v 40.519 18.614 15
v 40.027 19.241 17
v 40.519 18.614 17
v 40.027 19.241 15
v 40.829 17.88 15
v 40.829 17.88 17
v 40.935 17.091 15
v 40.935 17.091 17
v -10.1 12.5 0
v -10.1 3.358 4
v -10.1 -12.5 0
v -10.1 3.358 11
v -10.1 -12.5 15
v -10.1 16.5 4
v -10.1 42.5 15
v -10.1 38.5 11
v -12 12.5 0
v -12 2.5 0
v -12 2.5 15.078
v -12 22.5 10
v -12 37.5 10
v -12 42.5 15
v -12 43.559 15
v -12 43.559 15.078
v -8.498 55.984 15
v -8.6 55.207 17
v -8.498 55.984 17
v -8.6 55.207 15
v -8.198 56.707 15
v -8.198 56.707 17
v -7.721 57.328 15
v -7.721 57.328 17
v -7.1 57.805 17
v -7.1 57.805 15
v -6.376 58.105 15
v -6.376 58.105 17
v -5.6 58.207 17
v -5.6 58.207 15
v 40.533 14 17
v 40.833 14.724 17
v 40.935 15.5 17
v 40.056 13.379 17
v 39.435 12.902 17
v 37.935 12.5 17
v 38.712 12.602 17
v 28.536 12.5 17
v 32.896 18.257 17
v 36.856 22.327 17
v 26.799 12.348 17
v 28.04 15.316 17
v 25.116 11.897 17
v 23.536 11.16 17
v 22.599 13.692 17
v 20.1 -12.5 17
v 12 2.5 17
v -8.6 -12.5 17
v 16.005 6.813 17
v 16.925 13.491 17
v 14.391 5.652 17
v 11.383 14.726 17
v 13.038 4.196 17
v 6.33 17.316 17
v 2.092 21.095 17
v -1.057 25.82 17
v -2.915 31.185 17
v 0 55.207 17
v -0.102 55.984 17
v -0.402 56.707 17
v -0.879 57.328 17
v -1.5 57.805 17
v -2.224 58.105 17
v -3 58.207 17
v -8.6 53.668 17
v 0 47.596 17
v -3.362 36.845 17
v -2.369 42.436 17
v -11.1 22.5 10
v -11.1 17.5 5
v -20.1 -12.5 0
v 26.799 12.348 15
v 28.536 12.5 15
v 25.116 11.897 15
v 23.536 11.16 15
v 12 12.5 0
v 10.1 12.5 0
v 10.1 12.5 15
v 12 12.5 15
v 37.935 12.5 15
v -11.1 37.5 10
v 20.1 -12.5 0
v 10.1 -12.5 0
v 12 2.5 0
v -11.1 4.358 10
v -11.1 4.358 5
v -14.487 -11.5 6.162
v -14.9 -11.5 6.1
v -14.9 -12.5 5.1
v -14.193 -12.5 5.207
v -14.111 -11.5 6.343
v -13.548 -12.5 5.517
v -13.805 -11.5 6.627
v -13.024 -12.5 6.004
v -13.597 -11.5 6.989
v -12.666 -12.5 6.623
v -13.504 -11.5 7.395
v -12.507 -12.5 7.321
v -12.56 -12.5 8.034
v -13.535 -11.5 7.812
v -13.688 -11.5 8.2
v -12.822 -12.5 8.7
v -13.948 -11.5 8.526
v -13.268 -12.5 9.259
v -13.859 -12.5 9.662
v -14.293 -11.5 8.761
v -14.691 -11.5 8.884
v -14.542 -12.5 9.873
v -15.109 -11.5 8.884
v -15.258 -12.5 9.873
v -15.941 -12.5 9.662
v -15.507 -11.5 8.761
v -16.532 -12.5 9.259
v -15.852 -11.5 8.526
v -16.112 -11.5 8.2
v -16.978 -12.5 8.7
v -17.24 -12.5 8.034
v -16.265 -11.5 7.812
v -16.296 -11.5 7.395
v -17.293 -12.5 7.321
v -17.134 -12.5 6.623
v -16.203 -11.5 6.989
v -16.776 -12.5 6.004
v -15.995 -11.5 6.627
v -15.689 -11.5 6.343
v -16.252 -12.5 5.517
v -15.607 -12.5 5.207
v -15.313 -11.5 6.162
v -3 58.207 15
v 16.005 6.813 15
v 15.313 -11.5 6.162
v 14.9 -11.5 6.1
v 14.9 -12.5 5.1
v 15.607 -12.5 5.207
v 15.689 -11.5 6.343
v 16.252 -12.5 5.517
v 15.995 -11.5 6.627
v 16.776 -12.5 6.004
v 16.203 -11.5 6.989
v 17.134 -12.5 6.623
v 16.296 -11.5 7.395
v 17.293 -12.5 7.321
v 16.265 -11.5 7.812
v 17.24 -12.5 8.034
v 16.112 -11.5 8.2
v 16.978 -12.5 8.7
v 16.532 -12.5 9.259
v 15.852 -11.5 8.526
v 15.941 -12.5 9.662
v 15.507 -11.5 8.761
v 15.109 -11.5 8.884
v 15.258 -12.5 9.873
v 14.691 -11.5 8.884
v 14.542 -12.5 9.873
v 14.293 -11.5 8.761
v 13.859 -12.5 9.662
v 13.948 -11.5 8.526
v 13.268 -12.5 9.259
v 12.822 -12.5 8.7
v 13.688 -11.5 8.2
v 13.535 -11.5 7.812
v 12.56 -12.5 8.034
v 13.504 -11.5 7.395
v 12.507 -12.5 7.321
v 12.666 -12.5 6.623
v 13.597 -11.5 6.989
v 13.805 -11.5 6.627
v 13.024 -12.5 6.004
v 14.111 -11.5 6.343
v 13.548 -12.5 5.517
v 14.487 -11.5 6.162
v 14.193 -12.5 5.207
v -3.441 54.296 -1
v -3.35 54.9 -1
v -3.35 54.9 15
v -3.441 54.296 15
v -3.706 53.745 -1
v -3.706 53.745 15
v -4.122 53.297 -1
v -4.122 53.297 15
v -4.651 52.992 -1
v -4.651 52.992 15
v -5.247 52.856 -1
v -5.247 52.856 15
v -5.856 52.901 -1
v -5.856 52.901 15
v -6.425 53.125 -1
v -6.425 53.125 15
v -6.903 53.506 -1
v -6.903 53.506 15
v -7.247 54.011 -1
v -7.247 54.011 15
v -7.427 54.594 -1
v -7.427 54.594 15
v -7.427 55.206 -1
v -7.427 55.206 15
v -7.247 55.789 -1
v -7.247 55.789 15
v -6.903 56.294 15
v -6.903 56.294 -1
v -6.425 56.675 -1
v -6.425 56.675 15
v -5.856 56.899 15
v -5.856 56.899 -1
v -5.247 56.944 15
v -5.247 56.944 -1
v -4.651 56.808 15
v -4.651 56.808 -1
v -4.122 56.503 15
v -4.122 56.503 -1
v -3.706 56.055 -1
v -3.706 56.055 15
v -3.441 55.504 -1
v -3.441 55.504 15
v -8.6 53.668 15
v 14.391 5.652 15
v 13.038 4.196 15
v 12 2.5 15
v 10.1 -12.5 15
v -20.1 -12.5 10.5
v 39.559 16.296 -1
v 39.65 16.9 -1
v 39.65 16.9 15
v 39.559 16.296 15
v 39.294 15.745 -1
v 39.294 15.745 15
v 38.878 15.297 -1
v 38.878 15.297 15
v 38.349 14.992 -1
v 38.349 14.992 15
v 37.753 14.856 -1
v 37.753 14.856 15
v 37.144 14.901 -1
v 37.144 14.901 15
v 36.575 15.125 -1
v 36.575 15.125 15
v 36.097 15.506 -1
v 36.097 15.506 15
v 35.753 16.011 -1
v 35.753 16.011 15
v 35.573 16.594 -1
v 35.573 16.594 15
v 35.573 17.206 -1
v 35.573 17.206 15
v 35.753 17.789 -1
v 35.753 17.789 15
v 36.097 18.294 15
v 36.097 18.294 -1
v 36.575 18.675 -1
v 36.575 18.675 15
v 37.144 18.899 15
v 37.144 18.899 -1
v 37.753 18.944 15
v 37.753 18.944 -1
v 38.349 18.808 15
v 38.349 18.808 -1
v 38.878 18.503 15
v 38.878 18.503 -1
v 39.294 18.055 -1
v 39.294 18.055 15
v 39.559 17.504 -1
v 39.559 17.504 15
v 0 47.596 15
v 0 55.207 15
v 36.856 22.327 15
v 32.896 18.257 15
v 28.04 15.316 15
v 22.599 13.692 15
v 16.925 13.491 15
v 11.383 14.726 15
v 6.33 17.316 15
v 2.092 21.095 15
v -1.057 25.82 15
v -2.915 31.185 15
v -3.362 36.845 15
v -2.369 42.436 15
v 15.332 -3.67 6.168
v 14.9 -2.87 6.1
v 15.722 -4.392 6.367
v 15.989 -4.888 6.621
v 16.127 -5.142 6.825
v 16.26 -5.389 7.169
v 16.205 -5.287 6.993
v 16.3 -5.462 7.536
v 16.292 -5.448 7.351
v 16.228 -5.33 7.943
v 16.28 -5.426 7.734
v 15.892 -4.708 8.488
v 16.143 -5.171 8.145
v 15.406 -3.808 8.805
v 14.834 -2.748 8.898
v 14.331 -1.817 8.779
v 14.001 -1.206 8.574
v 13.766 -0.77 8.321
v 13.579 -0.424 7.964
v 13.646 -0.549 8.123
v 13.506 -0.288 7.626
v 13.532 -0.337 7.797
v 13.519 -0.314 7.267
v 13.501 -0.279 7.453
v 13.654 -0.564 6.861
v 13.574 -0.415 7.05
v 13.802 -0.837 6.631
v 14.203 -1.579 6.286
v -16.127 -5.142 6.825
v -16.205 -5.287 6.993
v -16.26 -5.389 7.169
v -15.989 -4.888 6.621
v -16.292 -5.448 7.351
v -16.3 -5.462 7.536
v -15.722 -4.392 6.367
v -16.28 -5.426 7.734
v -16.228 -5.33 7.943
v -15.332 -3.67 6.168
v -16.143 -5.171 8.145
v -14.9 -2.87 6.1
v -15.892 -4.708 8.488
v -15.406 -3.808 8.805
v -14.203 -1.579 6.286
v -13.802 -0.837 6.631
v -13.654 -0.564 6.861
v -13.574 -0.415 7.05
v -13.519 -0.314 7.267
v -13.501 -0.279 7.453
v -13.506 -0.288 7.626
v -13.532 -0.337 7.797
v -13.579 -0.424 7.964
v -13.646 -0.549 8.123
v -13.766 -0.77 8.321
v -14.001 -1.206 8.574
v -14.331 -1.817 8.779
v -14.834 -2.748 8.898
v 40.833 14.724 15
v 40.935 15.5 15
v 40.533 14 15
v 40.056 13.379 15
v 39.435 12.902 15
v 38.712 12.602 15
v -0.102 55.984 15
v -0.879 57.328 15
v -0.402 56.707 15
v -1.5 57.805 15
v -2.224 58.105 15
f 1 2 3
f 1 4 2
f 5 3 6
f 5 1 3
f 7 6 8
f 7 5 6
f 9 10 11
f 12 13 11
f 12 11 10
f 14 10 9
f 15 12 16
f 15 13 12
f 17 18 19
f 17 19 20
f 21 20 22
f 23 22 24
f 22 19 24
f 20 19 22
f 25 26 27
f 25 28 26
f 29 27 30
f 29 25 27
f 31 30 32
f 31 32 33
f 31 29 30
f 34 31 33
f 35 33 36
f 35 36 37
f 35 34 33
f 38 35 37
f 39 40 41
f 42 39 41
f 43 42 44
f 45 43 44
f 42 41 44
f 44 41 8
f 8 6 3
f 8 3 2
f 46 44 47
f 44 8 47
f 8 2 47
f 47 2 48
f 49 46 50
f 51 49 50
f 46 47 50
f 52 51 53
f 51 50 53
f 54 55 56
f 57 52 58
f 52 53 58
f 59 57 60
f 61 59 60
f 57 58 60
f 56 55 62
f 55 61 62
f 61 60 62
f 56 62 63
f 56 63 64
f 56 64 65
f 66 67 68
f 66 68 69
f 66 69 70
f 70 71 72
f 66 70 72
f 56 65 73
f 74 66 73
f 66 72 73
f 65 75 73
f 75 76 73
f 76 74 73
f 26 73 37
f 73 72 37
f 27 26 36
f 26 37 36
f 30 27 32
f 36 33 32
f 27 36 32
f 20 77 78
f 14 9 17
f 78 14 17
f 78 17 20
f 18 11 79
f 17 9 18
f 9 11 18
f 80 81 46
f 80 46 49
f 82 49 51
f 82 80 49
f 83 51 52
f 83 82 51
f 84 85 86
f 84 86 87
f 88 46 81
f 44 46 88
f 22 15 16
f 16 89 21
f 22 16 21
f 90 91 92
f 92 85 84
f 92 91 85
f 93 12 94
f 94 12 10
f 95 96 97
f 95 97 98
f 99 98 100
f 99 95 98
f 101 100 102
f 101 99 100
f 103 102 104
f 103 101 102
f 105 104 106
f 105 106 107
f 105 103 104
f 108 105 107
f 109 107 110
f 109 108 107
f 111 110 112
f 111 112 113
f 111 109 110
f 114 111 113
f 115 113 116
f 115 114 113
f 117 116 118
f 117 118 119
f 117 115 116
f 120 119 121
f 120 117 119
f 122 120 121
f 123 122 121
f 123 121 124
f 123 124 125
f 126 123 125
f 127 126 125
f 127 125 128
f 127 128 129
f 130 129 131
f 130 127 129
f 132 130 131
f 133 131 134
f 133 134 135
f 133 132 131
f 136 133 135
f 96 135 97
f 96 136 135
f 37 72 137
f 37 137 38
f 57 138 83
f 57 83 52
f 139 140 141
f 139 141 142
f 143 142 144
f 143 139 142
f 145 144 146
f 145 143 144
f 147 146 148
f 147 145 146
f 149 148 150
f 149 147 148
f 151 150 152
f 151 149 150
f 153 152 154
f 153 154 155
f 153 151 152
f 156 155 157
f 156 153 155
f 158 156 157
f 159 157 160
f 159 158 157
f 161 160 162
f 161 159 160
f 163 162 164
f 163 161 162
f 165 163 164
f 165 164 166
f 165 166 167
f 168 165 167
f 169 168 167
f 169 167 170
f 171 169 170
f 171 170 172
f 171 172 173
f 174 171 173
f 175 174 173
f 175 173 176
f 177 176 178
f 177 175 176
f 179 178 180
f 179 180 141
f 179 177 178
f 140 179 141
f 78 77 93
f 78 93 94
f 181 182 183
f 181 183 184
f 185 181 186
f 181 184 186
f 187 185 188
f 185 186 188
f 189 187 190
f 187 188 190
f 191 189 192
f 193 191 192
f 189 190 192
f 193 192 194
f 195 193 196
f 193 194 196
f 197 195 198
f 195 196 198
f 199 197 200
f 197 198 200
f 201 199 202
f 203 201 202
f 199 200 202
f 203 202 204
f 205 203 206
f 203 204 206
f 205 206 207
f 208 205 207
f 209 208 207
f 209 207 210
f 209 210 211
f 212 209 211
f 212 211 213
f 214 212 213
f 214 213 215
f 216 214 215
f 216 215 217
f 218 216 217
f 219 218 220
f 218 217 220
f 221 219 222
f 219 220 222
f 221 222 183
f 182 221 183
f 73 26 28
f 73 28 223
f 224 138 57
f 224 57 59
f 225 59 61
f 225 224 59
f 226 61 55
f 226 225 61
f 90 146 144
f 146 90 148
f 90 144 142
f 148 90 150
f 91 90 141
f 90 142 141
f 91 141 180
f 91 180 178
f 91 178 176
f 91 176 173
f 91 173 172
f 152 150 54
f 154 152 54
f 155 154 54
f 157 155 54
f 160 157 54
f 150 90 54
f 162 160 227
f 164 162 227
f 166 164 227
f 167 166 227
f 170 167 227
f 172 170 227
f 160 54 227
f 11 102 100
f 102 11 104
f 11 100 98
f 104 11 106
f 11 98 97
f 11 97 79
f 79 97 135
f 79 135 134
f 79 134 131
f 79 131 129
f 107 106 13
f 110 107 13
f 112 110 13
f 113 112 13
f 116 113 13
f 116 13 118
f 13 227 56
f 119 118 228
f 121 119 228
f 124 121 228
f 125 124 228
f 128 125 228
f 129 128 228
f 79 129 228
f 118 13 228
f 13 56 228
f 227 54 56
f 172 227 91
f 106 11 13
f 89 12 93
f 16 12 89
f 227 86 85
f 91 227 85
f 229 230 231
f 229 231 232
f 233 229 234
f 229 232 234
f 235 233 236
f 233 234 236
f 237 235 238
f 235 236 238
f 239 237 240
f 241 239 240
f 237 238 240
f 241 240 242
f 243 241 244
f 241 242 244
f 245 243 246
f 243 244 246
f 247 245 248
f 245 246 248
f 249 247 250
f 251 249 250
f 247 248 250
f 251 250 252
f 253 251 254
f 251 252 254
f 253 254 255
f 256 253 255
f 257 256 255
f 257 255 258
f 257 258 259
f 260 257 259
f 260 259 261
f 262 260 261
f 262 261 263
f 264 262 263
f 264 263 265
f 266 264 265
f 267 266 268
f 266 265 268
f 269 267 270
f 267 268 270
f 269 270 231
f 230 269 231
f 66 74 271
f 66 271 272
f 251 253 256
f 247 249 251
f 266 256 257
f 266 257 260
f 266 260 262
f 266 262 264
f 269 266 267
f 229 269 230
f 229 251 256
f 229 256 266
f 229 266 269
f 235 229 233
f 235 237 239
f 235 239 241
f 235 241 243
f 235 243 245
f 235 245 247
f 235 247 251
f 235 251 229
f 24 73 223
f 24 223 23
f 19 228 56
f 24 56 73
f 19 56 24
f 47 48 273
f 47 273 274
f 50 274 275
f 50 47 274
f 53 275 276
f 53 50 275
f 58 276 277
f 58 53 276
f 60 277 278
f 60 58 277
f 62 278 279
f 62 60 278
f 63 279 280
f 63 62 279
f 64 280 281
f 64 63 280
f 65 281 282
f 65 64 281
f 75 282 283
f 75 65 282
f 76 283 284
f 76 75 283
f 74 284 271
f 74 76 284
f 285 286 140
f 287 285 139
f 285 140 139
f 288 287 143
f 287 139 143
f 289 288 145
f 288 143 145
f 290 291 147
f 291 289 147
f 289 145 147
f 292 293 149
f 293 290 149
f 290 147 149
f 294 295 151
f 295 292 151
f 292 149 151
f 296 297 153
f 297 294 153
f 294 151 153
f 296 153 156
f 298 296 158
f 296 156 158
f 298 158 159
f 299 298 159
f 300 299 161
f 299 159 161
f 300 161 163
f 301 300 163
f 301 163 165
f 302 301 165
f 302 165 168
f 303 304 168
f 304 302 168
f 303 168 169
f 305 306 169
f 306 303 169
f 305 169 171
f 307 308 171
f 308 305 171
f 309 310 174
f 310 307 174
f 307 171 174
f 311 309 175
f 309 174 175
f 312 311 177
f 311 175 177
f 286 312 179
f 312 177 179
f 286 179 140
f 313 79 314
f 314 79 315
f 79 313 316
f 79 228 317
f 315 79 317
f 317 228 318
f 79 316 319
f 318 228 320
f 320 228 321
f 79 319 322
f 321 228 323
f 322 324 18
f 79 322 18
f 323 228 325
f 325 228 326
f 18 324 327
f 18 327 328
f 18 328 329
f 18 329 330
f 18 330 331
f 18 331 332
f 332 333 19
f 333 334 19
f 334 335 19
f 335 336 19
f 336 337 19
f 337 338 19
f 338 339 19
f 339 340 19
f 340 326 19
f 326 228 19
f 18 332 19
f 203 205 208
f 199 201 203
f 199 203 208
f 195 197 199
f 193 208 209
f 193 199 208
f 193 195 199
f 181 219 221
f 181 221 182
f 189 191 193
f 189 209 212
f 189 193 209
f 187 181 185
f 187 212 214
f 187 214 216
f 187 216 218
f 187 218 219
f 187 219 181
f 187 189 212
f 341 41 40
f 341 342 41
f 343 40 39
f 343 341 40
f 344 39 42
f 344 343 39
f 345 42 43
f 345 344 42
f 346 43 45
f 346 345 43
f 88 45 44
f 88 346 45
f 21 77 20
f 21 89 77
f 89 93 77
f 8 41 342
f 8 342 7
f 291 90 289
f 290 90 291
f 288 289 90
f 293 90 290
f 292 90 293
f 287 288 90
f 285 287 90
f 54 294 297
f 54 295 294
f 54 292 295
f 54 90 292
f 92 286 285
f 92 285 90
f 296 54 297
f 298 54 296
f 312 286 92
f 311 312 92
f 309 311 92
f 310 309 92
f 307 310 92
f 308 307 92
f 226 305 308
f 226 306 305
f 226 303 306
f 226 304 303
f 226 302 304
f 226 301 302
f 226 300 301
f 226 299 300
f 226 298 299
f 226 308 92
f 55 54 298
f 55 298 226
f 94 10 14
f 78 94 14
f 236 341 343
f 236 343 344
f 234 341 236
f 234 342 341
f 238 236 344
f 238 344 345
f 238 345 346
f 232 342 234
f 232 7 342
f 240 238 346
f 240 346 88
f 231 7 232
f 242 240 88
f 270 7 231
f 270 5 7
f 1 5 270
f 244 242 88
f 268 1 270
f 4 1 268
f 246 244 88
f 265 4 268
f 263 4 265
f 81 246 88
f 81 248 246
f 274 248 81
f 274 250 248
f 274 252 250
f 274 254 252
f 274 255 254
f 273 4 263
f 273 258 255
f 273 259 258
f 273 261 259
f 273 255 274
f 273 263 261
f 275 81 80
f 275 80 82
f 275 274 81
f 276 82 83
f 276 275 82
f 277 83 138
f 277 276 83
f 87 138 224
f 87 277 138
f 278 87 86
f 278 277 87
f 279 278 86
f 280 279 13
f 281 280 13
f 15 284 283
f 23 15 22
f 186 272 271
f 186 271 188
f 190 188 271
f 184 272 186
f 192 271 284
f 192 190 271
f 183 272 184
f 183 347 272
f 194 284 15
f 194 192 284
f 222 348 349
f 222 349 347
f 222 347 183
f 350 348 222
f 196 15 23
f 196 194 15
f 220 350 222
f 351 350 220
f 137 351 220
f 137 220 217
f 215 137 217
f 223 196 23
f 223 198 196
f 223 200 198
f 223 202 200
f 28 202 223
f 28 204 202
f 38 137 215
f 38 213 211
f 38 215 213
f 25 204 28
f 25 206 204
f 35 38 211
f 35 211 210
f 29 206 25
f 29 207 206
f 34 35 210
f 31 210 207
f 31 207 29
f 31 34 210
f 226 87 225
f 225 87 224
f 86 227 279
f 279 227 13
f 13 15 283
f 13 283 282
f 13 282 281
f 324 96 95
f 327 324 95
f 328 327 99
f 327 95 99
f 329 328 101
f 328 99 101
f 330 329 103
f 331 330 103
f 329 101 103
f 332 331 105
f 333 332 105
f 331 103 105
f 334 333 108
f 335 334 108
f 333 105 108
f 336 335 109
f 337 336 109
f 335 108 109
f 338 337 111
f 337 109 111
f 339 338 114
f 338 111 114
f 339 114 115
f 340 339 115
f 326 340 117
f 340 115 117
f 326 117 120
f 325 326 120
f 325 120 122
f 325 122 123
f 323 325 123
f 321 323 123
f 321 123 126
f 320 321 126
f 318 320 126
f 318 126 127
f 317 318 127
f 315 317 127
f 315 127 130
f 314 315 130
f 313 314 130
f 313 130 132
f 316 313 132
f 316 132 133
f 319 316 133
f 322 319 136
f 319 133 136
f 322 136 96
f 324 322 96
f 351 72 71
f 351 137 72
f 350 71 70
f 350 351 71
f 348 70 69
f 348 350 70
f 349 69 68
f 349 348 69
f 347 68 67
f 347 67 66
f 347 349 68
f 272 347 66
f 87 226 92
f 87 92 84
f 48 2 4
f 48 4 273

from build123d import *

# Parameters (mm, degrees)
SKETCH1_W               = 24
SKETCH1_H               = 25
BOSS_EXTRUDE1_DEPTH     = 17
SKETCH2_W               = 20.2
SKETCH2_H               = 15
CUT_EXTRUDE1_DEPTH      = 33.526911935
BOSS_EXTRUDE2_DEPTH     = 17
SKETCH5_R               = 1.4
CUT_EXTRUDE5_DEPTH      = 37.304407446
BOSS_EXTRUDE3_DEPTH     = 2
CUT_EXTRUDE4_DEPTH      = 74.16252394
CUT_EXTRUDE4_DEPTH_BACK = 74.16252394
SKETCH7_R               = 2.05
BOSS_EXTRUDE4_DEPTH     = 16
CHAMFER1_SIZE           = 1
CHAMFER2_SIZE           = 8
CHAMFER2_SIZE2          = 13.856406461
FILLET1_R               = 10
SKETCH8_W               = 1.9
SKETCH8_H               = 25
BOSS_EXTRUDE5_DEPTH     = 5
CHAMFER5_SIZE           = 5
CHAMFER6_SIZE           = 10
FILLET5_R               = 3
SKETCH9_W               = 5
SKETCH9_H               = 20.312892552
CUT_EXTRUDE6_DEPTH      = 1
CHAMFER7_SIZE           = 1


# Some blends are built 0.0001 mm under size
with BuildPart() as part:
    # Sketch1 → Boss-Extrude1 (new body)
    with BuildSketch(Plane.XY):
        Rectangle(SKETCH1_W, SKETCH1_H)
    extrude(amount=BOSS_EXTRUDE1_DEPTH)

    # Sketch2 → Cut-Extrude1 (cut, through all)
    with BuildSketch(Plane(origin=(0, 12.5, 0), x_dir=(1, 0, 0), z_dir=(0, 1, 0))):
        with Locations((0, -7.5)):
            Rectangle(SKETCH2_W, SKETCH2_H)
    extrude(amount=-CUT_EXTRUDE1_DEPTH, mode=Mode.SUBTRACT)

    # Sketch3 → Boss-Extrude2 (add)
    with BuildSketch(Plane.XY.offset(17)):
        Polygon((-12, -12.5), (-20.1, -12.5), (-12, 2.5), align=None)
        Polygon((12, -12.5), (20.1, -12.5), (12, 2.5), align=None)
    extrude(amount=-BOSS_EXTRUDE2_DEPTH)

    # Sketch5 → Cut-Extrude5 (cut, through all)
    with BuildSketch(Plane.XZ.offset(12.5)):
        with Locations(Location((-14.9, 7.5, 0), (0, 0, 270))):
            Circle(SKETCH5_R)
        with Locations(Location((14.9, 7.5, 0), (0, 0, 270))):
            Circle(SKETCH5_R)
    extrude(amount=-CUT_EXTRUDE5_DEPTH, mode=Mode.SUBTRACT)

    # Sketch6 → Boss-Extrude3 (add)
    with BuildSketch(Plane.XY.offset(17)):
        with BuildLine():
            Line((12, 12.5), (40.935171065, 12.5))
            Line((40.935171065, 12.5), (40.935171065, 18.357473763))
            Line((40.935171065, 18.357473763), (36.855912663, 22.32654969))
            ThreePointArc((36.855912663, 22.32654969), (6.329925709, 17.315872383), (0, 47.595813056))
            Line((0, 47.595813056), (0, 58.207101621))
            Line((0, 58.207101621), (-8.6, 58.207101621))
            Line((-8.6, 58.207101621), (-8.6, 53.667646312))
            Line((-8.6, 53.667646312), (-12, 43.559109862))
            Line((-12, 43.559109862), (-12, 12.5))
            Line((-12, 12.5), (12, 12.5))
        make_face()
    extrude(amount=-BOSS_EXTRUDE3_DEPTH)

    # Sketch4 → Cut-Extrude4 (cut, two sides: drawn at the far end of the back side and taken through both)
    with BuildSketch(Plane(origin=(0, 0, 0), x_dir=(1, 0, 0), z_dir=(0, 1, 0)).offset(-CUT_EXTRUDE4_DEPTH_BACK)):
        Polygon((-8.6, -17), (-20.1, -17), (-20.1, -10.5), align=None)
    extrude(amount=CUT_EXTRUDE4_DEPTH + CUT_EXTRUDE4_DEPTH_BACK, mode=Mode.SUBTRACT)

    # Sketch7 → Boss-Extrude4 (add)
    with BuildSketch(Plane(origin=(0, 0, 15), x_dir=(-1, 0, 0), z_dir=(0, 0, -1))):
        with Locations(Location((-37.6, 16.9, 0), (0, 0, 180))):
            Circle(SKETCH7_R)
        with Locations(Location((5.4, 54.9, 0), (0, 0, 180))):
            Circle(SKETCH7_R)
    extrude(amount=BOSS_EXTRUDE4_DEPTH)

    # Chamfer1
    chamfer1_edges = [part.edges().sort_by_distance(p)[0] for p in [
        (-14.9, -12.5, 8.9),
        (14.9, -12.5, 8.9),
    ]]
    chamfer(chamfer1_edges, length=CHAMFER1_SIZE)

    # Chamfer2
    chamfer2_edges = [part.edges().sort_by_distance(p)[0] for p in [
        (12, 12.5, 16),
    ]]
    chamfer2_side = [part.faces().sort_by_distance(p)[0] for p in [
        (12, 7.5, 8.5),
    ]]
    chamfer(chamfer2_edges, length=CHAMFER2_SIZE, length2=CHAMFER2_SIZE2, reference=chamfer2_side[0])

    # Fillet1
    # the kernel refuses this fillet: 10 mm, written as the material it adds along each edge
    with BuildSketch(Plane(origin=(12, 4.5, 15), x_dir=(0.8660254037844397, 0.4999999999999979, 0), z_dir=(0, 0, 1))) as fillet1_piece_1:
        with BuildLine():
            CenterArc((4.625034769, -10), FILLET1_R, 90, 34.229107271)
            Line((-1, -1.732050808), (-1.112500695, -1.566691824))
            ThreePointArc((-1.112500695, -1.566691824), (-0.673205081, -0.766025404), (-0.173205081, 0.1))
            Line((-0.173205081, 0.1), (0, 0.2))
            Line((0, 0.2), (4.625034769, 0.2))
            Line((4.625034769, 0.2), (4.625034769, 0))
        make_face()
    extrude(amount=2)
    with BuildSketch(Plane(origin=(25.856406461, 12.5, 15), x_dir=(1, 0, 0), z_dir=(0, 0, 1))) as fillet1_piece_2:
        with BuildLine():
            CenterArc((FILLET1_R * 0.267949192431, -FILLET1_R), FILLET1_R, 90, 30)
            Line((-FILLET1_R * 0.232050807569, -FILLET1_R * 0.133974596216), (-FILLET1_R * 0.242050807569, -FILLET1_R * 0.11665408814))
            Line((-FILLET1_R * 0.242050807569, -FILLET1_R * 0.11665408814), (-FILLET1_R * 0.00535898384862, FILLET1_R * 0.02))
            Line((-FILLET1_R * 0.00535898384862, FILLET1_R * 0.02), (FILLET1_R * 0.267949192431, FILLET1_R * 0.02))
            Line((FILLET1_R * 0.267949192431, FILLET1_R * 0.02), (FILLET1_R * 0.267949192431, 0))
        make_face()
    extrude(amount=2)

    # Sketch8 → Boss-Extrude5 (add)
    with BuildSketch(Plane(origin=(0, 0, 15), x_dir=(-1, 0, 0), z_dir=(0, 0, -1))):
        with Locations((11.05, 25)):
            Rectangle(SKETCH8_W, SKETCH8_H)
    extrude(amount=BOSS_EXTRUDE5_DEPTH)

    # Chamfer5
    chamfer5_edges = [part.edges().sort_by_distance(p)[0] for p in [
        (-11.05, 37.5, 15),
    ]]
    chamfer(chamfer5_edges, length=CHAMFER5_SIZE - 0.0001)  # a hair under: the kernel refuses the full size

    # Chamfer6
    chamfer6_edges = [part.edges().sort_by_distance(p)[0] for p in [
        (-11.05, 12.5, 10),
    ]]
    chamfer(chamfer6_edges, length=CHAMFER6_SIZE - 0.0001)  # a hair under: the kernel refuses the full size

    # Fillet5
    fillet5_edges = [part.edges().sort_by_distance(p)[0] for p in [
        (40.935171065, 18.357473763, 16),
        (40.935171065, 12.5, 16),
        (-8.6, 58.207101621, 16),
        (0, 58.207101621, 16),
    ]]
    fillet(fillet5_edges, radius=FILLET5_R)

    # Sketch9 → Cut-Extrude6 (cut)
    with BuildSketch(Plane(origin=(-10.1, 0, 0), x_dir=(0, 0, -1), z_dir=(1, 0, 0))):
        with Locations((-7.5, 14.513989876)):
            Rectangle(SKETCH9_W, SKETCH9_H)
    extrude(amount=-CUT_EXTRUDE6_DEPTH, mode=Mode.SUBTRACT)

    # Chamfer7
    chamfer7_edges = [part.edges().sort_by_distance(p)[0] for p in [
        (-10.1, 10.9287218, 5),
        (-10.1, 4.3575436, 7.5),
        (-10.1, 20.9287718, 10),
    ]]
    chamfer(chamfer7_edges, length=CHAMFER7_SIZE - 0.0001)  # a hair under: the kernel refuses the full size


solid = part.part
